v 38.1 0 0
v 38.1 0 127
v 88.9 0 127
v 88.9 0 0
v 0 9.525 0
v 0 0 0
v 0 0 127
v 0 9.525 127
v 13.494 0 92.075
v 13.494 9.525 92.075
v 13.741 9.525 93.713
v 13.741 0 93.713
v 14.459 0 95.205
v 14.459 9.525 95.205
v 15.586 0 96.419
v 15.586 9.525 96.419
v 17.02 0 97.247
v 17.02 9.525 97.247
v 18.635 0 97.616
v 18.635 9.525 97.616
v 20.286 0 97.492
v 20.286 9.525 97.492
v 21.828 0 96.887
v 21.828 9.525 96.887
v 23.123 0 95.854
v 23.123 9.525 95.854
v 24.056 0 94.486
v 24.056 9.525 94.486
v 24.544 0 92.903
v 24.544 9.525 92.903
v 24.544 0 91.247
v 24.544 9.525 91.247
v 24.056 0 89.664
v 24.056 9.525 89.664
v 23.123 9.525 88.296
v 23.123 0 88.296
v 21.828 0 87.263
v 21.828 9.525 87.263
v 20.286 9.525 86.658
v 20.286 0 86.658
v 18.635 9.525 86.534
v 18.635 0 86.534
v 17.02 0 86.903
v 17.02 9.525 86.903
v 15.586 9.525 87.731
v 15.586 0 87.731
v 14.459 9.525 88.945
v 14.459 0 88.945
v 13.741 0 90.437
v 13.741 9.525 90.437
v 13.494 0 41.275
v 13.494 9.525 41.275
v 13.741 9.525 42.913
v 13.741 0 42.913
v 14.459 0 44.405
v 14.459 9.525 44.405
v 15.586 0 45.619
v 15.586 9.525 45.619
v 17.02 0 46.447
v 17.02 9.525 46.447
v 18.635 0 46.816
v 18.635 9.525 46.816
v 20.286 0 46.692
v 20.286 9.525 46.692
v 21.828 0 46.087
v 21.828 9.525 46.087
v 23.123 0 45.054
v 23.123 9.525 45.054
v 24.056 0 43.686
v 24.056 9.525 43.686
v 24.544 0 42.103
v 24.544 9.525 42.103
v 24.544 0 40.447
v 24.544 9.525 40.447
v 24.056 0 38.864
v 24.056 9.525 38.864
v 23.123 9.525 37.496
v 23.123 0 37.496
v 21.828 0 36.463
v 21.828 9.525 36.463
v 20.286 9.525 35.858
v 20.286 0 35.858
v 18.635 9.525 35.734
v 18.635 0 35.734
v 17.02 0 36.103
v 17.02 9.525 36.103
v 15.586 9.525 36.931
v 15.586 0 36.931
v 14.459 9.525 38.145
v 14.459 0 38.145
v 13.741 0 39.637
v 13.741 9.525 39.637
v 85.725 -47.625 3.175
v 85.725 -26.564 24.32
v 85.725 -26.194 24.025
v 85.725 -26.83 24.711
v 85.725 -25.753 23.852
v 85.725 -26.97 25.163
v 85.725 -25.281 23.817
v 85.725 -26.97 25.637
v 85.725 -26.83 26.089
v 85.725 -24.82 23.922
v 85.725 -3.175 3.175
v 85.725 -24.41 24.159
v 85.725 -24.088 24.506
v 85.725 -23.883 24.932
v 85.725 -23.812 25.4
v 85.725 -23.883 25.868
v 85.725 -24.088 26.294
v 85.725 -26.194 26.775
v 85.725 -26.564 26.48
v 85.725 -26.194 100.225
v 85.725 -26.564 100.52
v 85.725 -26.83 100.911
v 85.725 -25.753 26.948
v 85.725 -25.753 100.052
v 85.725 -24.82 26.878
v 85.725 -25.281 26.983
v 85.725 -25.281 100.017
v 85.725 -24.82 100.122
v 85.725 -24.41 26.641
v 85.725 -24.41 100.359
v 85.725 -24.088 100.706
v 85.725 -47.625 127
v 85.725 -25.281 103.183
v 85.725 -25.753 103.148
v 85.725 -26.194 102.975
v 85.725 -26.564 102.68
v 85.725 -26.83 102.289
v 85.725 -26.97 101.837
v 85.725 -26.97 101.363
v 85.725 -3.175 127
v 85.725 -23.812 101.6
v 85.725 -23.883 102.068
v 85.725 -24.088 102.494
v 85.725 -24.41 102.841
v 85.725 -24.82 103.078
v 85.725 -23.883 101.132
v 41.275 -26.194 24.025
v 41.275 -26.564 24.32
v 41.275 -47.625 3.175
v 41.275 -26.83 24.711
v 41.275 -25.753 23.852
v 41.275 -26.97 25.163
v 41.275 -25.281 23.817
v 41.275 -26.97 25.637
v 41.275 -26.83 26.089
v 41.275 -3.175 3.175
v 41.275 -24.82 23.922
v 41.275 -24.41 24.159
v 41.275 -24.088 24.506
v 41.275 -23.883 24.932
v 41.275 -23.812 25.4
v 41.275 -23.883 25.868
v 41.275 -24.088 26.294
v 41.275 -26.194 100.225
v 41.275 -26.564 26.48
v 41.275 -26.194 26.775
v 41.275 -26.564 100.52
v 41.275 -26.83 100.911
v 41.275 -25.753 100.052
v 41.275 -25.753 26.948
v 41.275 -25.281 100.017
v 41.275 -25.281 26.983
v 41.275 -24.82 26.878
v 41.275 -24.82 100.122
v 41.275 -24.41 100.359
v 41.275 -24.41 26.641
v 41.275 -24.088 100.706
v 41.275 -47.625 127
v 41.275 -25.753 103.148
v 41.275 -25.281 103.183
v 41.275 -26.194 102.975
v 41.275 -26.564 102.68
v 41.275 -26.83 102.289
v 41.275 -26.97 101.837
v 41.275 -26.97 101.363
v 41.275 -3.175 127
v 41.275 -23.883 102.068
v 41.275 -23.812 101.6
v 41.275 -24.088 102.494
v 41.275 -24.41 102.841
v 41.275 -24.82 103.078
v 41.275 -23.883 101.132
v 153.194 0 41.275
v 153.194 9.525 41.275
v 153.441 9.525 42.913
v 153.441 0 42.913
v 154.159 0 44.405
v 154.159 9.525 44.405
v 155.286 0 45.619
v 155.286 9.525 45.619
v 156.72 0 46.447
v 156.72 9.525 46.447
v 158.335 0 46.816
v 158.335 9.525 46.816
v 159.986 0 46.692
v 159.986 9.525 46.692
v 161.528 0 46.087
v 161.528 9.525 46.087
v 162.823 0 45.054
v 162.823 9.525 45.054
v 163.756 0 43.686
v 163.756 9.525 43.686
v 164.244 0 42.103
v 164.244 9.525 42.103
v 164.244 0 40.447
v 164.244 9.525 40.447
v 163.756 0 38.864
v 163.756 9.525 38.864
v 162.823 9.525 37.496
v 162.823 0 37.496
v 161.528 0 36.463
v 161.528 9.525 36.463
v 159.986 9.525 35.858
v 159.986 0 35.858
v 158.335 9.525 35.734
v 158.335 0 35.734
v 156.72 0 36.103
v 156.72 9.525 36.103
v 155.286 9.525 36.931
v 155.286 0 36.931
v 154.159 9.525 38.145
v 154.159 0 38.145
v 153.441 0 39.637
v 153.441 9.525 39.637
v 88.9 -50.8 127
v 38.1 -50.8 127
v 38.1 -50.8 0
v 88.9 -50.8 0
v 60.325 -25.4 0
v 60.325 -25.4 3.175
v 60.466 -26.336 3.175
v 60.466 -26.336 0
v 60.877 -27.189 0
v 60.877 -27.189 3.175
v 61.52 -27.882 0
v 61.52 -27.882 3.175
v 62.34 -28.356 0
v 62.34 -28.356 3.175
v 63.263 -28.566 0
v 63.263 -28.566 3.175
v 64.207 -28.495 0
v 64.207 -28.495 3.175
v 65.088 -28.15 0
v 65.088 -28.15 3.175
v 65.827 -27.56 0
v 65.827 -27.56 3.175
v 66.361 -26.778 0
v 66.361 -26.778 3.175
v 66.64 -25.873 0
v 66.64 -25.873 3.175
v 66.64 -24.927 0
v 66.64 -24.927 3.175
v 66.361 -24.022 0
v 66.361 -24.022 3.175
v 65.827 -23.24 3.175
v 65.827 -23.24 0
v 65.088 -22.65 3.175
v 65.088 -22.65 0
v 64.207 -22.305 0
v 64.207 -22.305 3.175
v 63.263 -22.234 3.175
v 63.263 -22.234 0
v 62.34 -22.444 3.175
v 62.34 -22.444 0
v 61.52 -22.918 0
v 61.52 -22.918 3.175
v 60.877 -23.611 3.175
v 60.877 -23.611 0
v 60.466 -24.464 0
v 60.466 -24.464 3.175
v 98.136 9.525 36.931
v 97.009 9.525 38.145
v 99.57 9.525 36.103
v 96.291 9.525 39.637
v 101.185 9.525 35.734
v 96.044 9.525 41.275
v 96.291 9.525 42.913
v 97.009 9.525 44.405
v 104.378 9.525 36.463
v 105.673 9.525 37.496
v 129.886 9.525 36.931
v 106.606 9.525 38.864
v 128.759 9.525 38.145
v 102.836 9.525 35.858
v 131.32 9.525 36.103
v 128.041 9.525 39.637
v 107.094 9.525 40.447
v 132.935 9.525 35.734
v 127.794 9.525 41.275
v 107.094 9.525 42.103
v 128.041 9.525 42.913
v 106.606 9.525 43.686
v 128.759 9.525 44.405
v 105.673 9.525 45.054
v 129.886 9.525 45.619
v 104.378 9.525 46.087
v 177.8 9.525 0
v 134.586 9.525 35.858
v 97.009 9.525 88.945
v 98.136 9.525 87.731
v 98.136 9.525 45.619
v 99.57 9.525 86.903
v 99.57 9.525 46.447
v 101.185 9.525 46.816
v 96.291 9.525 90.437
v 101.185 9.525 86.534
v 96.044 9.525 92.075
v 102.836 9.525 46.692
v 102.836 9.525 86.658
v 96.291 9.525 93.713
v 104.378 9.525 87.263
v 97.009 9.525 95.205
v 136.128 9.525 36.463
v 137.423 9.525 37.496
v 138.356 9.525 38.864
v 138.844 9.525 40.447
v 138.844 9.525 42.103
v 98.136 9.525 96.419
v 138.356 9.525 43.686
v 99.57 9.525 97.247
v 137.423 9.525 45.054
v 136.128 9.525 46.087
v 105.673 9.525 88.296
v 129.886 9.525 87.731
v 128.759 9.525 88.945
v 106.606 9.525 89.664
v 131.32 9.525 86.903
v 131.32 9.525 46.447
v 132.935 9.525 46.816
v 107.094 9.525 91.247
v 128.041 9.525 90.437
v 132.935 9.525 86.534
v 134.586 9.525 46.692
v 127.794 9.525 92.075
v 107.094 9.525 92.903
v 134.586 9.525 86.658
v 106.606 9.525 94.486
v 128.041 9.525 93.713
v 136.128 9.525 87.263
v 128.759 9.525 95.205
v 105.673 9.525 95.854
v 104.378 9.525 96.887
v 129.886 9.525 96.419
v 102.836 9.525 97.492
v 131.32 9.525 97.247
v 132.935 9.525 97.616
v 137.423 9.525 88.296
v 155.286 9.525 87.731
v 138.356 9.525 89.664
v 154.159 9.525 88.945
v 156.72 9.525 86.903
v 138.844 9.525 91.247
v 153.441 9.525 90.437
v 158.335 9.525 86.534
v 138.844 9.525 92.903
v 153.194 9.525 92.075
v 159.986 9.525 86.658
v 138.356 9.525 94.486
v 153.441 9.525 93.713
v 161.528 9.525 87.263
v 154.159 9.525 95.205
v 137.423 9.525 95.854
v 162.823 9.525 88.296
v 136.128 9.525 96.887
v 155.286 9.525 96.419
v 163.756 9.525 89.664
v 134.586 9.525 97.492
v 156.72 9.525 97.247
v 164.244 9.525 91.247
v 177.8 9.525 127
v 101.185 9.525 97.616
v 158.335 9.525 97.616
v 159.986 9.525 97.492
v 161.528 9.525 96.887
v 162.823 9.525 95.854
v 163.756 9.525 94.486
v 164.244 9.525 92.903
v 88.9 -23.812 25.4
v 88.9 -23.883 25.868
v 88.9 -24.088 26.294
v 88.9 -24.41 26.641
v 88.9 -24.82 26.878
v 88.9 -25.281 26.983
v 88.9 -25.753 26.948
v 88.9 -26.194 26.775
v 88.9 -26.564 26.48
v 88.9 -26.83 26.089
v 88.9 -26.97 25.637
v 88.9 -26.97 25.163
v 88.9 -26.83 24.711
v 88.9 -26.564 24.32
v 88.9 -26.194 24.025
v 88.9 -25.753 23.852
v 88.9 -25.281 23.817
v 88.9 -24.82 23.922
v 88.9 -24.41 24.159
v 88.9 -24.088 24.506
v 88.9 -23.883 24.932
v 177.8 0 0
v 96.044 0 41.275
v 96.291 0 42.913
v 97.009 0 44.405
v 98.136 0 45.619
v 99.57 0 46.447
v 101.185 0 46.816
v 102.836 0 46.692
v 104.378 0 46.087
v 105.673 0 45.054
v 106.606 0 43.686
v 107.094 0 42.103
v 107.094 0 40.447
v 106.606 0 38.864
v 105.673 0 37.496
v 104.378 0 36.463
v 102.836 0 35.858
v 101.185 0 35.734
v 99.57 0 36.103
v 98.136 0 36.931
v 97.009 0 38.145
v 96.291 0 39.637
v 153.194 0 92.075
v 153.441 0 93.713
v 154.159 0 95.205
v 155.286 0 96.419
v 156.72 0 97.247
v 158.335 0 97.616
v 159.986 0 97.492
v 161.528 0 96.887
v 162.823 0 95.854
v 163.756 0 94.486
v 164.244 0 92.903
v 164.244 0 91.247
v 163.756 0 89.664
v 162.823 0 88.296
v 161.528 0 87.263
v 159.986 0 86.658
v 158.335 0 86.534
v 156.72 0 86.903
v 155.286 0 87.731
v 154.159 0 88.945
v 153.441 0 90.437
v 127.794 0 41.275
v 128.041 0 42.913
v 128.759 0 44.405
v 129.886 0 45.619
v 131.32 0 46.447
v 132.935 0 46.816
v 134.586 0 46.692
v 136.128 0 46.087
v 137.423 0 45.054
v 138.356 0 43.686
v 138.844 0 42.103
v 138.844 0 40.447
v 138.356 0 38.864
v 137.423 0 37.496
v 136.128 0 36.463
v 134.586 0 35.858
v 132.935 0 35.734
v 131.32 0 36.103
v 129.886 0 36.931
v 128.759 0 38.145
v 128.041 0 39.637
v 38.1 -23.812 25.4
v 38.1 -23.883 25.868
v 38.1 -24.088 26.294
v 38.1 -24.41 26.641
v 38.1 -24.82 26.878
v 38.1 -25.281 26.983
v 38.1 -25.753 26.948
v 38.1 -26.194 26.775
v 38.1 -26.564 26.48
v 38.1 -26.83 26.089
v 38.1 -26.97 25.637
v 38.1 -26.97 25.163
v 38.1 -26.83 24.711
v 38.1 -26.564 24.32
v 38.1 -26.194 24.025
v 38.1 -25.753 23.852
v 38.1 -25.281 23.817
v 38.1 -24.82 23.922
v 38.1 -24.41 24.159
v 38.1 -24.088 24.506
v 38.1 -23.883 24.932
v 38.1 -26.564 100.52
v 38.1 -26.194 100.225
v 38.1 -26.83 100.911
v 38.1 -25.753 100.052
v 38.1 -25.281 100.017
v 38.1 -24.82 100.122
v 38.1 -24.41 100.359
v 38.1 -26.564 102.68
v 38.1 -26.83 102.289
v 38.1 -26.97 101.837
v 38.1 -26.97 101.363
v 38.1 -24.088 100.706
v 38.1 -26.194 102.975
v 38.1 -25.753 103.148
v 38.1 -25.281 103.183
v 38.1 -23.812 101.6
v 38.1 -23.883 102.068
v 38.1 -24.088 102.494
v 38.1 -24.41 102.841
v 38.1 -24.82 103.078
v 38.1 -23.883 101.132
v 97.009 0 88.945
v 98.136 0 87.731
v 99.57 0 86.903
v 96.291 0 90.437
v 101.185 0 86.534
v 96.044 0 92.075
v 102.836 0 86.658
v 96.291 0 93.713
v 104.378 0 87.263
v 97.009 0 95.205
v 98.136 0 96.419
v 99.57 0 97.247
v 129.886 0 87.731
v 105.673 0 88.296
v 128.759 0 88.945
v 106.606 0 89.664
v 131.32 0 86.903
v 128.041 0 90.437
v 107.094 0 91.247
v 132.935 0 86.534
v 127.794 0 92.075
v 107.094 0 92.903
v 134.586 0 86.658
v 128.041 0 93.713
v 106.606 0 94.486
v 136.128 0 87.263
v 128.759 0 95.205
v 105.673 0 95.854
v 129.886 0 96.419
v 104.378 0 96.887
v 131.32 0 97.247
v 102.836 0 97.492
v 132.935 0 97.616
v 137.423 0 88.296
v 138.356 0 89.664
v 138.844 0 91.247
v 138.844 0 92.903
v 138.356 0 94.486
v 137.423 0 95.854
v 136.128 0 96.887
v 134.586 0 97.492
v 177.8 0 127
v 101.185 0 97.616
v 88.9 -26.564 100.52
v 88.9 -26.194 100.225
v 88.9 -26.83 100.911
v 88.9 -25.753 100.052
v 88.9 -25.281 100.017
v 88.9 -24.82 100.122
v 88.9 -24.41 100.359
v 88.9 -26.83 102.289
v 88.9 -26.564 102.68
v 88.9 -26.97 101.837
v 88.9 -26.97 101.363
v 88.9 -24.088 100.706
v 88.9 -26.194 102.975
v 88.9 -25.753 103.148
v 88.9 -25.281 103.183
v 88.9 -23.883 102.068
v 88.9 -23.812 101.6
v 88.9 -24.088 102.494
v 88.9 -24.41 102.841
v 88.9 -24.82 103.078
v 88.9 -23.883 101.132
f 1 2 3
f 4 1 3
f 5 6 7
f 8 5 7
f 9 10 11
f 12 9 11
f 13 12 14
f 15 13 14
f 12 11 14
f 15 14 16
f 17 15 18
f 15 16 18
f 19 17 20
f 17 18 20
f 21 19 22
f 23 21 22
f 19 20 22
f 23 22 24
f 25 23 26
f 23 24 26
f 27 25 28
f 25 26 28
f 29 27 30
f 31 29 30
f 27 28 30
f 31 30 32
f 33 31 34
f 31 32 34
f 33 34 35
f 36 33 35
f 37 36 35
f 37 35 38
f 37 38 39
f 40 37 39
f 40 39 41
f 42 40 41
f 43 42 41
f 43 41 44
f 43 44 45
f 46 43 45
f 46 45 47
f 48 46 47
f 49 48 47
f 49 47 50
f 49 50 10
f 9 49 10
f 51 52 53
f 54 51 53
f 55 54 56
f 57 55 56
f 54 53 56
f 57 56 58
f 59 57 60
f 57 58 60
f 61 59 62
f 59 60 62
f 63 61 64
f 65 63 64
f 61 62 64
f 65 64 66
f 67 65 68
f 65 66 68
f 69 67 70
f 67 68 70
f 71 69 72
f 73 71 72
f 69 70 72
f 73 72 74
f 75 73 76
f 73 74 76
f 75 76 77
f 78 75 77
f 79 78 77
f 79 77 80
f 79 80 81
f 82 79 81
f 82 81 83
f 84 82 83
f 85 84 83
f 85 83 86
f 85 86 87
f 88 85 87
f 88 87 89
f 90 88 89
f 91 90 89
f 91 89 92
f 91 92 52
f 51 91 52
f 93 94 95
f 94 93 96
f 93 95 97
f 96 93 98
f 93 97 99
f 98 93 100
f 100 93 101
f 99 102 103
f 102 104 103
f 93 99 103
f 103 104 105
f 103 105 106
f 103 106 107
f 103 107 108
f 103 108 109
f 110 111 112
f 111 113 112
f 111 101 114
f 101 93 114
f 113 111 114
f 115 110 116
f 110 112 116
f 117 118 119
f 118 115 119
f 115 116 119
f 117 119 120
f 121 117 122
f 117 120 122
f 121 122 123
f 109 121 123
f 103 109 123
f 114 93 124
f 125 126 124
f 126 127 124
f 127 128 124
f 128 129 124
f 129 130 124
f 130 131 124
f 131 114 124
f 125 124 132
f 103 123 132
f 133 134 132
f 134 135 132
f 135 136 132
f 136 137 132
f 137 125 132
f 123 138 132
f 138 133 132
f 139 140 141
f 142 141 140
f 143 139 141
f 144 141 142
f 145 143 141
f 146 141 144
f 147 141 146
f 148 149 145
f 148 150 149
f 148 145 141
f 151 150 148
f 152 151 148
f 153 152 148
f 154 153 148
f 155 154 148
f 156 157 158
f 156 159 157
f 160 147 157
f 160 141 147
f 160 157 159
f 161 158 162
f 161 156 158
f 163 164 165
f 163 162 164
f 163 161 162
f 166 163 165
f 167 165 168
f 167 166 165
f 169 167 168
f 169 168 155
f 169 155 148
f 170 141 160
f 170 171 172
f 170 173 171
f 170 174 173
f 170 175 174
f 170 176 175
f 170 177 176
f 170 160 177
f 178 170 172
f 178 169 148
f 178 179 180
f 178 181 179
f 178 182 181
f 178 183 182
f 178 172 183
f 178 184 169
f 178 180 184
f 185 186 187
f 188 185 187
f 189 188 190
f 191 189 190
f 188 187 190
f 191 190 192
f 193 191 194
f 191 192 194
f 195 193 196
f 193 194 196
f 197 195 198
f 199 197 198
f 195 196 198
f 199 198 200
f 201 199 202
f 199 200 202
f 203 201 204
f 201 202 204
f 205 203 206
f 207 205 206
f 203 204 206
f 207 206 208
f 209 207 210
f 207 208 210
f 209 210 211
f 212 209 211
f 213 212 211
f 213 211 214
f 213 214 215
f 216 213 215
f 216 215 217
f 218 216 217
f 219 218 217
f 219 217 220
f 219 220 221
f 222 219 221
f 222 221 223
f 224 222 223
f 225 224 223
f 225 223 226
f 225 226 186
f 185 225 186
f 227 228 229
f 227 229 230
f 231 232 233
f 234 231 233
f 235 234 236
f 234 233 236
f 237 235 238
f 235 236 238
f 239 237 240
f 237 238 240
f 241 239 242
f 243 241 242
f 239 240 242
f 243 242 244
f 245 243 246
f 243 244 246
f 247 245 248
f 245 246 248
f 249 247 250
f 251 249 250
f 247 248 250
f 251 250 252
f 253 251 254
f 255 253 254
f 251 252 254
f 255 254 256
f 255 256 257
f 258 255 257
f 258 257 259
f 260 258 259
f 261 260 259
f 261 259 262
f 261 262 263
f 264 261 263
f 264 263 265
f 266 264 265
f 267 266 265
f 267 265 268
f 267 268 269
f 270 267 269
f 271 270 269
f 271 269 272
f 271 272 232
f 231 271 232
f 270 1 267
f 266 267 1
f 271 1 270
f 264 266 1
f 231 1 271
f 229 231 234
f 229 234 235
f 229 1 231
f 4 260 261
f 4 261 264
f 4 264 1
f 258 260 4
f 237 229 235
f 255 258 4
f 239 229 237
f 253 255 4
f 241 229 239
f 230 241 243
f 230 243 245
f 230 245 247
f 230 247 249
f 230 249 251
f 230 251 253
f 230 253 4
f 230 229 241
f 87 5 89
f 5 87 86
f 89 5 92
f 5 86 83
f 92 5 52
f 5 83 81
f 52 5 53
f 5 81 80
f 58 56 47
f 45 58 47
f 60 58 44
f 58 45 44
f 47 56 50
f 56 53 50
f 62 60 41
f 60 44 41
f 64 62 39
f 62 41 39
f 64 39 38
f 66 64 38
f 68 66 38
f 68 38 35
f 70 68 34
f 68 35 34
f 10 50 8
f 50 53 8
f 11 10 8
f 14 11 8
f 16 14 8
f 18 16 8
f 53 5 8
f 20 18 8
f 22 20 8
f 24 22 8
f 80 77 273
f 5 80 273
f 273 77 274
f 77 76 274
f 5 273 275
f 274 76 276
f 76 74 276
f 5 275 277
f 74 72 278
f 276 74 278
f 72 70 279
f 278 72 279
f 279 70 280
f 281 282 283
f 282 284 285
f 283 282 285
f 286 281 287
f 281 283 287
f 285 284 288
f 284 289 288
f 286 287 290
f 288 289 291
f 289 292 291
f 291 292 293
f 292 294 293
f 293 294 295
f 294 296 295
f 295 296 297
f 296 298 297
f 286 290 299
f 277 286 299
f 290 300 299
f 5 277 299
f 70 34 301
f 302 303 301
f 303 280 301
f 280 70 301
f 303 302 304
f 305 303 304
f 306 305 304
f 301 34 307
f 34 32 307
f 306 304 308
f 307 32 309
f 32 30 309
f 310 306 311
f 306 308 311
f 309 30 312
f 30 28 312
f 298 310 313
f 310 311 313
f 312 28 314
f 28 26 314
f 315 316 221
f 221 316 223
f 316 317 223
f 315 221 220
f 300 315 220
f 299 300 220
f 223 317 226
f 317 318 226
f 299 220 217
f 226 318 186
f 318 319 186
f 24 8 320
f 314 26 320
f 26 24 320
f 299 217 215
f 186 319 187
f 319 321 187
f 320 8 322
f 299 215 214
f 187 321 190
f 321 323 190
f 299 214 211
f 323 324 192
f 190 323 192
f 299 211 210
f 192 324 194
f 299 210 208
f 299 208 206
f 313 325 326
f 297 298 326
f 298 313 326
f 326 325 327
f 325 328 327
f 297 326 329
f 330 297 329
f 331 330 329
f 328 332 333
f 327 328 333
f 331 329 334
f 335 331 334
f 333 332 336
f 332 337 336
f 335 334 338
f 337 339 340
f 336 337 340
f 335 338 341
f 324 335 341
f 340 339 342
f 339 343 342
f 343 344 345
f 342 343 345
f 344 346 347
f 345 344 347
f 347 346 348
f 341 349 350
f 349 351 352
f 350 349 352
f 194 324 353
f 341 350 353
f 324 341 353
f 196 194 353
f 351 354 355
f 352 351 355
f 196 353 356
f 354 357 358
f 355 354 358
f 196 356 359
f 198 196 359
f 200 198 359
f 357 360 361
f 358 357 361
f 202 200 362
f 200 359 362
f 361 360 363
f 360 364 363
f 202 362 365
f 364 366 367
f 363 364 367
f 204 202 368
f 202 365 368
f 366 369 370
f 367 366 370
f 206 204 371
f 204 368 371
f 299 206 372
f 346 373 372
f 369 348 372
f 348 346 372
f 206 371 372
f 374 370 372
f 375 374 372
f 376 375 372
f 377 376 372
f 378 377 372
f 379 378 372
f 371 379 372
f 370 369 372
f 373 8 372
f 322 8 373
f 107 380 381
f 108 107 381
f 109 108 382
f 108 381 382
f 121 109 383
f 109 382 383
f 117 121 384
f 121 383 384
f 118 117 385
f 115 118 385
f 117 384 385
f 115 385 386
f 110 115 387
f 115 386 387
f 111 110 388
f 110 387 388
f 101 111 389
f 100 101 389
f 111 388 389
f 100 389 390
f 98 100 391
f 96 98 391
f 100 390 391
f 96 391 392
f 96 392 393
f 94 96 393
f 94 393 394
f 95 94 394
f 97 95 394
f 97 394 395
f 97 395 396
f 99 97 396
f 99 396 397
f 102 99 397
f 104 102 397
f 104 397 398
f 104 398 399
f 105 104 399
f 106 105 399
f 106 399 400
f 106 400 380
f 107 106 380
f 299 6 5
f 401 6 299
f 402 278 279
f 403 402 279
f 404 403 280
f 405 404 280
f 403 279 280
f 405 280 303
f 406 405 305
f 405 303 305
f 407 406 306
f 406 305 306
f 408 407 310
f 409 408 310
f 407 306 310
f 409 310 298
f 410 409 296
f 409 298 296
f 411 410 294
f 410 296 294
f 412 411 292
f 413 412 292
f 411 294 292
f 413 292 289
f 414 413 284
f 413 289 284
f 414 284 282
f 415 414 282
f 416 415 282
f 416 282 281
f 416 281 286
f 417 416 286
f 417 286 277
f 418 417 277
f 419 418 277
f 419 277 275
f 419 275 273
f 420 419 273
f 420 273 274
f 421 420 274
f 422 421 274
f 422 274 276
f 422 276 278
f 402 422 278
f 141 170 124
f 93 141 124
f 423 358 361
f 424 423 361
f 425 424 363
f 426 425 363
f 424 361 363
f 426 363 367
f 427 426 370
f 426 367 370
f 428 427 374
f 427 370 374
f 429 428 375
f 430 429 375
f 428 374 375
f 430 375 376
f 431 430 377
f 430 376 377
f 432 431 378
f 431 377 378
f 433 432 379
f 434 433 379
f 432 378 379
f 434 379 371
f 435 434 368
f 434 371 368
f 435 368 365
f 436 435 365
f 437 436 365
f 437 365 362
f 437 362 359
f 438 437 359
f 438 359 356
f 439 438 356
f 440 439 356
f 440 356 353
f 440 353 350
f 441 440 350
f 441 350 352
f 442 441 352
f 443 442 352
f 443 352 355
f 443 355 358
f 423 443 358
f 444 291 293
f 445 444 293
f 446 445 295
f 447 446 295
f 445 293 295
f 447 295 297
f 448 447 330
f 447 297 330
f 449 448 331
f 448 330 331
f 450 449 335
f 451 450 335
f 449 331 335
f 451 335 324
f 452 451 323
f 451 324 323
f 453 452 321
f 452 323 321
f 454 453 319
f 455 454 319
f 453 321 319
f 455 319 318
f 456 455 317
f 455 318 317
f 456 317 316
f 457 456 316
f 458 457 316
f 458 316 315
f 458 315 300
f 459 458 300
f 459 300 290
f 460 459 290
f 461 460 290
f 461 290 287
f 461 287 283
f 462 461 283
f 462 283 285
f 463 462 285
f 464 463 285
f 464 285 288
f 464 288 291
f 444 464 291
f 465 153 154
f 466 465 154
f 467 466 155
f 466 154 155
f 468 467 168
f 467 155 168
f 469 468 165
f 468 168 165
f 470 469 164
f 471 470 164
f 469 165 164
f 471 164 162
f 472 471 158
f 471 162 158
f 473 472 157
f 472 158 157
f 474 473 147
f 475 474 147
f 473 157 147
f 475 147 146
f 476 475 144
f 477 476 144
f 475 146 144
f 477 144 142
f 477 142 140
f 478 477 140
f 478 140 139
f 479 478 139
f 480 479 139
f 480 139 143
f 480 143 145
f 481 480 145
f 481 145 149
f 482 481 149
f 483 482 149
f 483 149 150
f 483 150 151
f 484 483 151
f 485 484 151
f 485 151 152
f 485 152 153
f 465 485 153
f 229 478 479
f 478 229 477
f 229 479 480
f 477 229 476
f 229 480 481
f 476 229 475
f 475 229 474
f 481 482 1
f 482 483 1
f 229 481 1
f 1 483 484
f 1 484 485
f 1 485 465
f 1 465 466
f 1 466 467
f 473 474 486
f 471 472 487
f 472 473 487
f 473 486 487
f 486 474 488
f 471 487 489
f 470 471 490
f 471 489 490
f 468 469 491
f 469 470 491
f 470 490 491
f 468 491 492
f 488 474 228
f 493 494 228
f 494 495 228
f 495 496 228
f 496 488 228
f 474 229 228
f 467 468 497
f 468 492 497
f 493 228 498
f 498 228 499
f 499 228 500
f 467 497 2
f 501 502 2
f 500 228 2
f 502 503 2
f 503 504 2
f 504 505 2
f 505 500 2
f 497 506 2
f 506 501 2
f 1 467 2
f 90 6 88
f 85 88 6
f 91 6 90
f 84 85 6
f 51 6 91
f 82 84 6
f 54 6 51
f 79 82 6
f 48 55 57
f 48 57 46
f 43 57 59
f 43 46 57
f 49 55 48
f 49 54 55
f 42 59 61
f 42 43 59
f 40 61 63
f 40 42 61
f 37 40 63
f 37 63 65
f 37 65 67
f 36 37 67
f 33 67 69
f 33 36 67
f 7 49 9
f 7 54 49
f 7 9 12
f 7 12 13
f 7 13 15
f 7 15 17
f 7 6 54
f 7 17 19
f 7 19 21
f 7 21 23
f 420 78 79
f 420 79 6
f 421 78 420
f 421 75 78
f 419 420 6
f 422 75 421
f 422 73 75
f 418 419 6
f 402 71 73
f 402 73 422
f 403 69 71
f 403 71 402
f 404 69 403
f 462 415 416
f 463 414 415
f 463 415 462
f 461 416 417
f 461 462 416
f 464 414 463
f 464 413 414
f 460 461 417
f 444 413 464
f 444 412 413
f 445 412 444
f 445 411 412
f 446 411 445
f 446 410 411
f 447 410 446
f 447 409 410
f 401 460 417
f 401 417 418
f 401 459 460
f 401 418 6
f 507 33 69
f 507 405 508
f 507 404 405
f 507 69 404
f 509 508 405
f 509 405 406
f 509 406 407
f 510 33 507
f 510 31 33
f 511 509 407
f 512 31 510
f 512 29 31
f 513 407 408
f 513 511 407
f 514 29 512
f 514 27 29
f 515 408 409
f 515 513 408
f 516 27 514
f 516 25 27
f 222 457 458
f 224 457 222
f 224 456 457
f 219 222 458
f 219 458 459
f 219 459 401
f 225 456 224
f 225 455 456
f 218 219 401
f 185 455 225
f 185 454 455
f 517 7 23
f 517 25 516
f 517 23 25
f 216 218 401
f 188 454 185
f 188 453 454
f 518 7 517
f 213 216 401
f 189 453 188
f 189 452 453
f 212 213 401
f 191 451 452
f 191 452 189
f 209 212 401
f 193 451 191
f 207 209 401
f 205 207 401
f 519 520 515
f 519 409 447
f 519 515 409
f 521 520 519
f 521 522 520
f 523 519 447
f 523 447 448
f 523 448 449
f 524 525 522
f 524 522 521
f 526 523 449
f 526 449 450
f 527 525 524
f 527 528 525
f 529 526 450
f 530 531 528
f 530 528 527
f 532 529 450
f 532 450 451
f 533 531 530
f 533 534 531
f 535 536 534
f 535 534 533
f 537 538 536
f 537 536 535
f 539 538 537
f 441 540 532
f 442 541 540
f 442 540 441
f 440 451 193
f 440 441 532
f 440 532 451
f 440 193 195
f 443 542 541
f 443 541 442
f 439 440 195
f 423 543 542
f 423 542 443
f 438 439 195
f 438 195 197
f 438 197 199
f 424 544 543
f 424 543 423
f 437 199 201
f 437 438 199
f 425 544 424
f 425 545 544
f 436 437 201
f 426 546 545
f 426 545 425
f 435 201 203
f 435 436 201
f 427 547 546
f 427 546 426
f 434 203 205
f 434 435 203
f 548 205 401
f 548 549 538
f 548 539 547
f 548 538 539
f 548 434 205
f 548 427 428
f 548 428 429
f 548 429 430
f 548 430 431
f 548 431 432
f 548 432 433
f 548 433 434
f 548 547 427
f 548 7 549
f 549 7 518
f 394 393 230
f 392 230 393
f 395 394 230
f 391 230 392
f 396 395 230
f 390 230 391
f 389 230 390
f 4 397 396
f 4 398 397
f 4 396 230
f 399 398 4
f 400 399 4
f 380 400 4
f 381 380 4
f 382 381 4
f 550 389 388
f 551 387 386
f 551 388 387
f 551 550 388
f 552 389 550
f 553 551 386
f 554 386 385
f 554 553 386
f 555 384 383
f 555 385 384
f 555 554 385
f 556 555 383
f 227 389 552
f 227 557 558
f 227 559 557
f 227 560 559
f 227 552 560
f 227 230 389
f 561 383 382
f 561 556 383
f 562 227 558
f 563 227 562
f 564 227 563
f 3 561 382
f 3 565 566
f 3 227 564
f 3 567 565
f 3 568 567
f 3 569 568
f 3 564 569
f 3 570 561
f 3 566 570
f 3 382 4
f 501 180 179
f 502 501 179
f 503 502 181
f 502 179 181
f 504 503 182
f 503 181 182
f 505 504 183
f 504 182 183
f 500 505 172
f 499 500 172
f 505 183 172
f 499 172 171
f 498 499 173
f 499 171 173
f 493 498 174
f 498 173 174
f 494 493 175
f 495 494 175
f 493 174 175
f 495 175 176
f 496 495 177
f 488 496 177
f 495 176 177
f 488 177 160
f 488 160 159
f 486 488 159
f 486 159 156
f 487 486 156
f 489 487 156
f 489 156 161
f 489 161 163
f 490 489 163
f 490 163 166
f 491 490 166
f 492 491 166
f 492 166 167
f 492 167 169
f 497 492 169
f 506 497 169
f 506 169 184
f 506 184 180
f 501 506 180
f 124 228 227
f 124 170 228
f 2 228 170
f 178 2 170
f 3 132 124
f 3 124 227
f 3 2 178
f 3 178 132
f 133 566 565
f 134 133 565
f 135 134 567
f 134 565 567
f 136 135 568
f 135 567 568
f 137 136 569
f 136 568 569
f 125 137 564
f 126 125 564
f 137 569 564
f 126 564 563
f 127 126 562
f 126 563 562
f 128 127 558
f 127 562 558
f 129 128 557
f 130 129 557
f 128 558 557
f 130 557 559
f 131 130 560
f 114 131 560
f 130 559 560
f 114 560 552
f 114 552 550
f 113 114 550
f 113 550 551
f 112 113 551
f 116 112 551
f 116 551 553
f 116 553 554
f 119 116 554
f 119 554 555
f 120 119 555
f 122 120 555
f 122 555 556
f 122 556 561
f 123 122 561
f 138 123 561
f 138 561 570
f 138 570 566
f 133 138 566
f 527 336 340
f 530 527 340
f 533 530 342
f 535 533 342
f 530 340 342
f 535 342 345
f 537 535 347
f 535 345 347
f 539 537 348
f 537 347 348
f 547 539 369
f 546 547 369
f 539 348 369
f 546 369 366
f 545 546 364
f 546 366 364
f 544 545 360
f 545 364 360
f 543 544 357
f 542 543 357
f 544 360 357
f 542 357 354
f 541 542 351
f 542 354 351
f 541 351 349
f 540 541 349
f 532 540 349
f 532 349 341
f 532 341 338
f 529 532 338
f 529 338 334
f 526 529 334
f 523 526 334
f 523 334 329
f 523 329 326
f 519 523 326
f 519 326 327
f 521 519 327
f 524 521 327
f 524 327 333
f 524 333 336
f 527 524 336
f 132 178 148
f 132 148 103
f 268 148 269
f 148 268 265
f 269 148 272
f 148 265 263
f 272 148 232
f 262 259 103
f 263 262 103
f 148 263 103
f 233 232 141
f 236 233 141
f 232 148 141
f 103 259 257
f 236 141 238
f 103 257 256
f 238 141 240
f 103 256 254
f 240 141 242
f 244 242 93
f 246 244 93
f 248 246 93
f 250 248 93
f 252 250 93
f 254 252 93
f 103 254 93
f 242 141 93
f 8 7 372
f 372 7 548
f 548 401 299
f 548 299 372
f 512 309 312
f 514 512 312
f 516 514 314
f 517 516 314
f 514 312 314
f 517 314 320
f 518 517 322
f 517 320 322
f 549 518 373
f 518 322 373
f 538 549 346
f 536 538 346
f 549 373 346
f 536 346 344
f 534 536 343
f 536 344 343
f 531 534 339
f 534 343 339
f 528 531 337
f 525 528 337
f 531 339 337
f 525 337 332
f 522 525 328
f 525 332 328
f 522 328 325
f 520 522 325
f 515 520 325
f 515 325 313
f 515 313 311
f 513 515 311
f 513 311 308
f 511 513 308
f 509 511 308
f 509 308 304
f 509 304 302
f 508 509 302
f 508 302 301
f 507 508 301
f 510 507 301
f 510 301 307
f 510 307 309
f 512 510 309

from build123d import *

# Parameters (mm, degrees)
F0_W     = 177.8
F0_H     = 127
F1_DEPTH = 9.525
F3_D     = 11.1125
F4_W     = 50.8
F4_H     = 50.8
F4_W_2   = 44.45
F4_H_2   = 44.45
F5_DEPTH = 127
F7_D     = 3.175
F8_W     = 22.225
F8_H     = 44.45
F9_DEPTH = 3.175
F10_D    = 6.35


# Not quite as in the source:
# - a feature names something its author has since deleted; it is built from what else it names


with BuildPart() as f1:
    # F0 (on Front) → F1 (new body)
    with BuildSketch(Plane.XZ):
        with Locations((88.9, 63.5)):
            Rectangle(F0_W, F0_H)
    extrude(amount=-F1_DEPTH)

    # F3 (through all)
    with Locations(Plane.XZ):
        with Locations((101.6, 92.075), (133.35, 92.075), (158.75, 92.075), (158.75, 41.275), (133.35, 41.275), (101.6, 41.275), (19.05, 92.075), (19.05, 41.275)):
            Hole(F3_D / 2)


with BuildPart() as f5:
    # F4 (on face) → F5 (new body)
    with BuildSketch(Plane.XY.offset(127)):
        with Locations((63.5, -25.4)):
            Rectangle(F4_W, F4_H)
        with Locations((63.5, -25.4)):
            Rectangle(F4_W_2, F4_H_2, mode=Mode.SUBTRACT)
    extrude(amount=-F5_DEPTH)

    # F7 (through all)
    with Locations(Plane(origin=(38.1, 0, 0), x_dir=(0, -1, 0), z_dir=(-1, 0, 0))):
        with Locations((25.4, 101.6), (25.4, 25.4)):
            Hole(F7_D / 2)

    # F8 (on face) → F9 (join)
    with BuildSketch(Plane(origin=(0, 0, 0), x_dir=(1, 0, 0), z_dir=(0, 0, -1))):
        with Locations((74.6125, 25.4)):
            Rectangle(F8_W, F8_H)
        with Locations((52.3875, 25.4)):
            Rectangle(F8_W, F8_H)
    extrude(amount=-F9_DEPTH)

    # F10 (through all)
    with Locations(Plane(origin=(0, 0, 0), x_dir=(1, 0, 0), z_dir=(0, 0, -1))):
        with Locations((63.5, 25.4)):
            Hole(F10_D / 2)


solid = Compound([f1.part, f5.part])
